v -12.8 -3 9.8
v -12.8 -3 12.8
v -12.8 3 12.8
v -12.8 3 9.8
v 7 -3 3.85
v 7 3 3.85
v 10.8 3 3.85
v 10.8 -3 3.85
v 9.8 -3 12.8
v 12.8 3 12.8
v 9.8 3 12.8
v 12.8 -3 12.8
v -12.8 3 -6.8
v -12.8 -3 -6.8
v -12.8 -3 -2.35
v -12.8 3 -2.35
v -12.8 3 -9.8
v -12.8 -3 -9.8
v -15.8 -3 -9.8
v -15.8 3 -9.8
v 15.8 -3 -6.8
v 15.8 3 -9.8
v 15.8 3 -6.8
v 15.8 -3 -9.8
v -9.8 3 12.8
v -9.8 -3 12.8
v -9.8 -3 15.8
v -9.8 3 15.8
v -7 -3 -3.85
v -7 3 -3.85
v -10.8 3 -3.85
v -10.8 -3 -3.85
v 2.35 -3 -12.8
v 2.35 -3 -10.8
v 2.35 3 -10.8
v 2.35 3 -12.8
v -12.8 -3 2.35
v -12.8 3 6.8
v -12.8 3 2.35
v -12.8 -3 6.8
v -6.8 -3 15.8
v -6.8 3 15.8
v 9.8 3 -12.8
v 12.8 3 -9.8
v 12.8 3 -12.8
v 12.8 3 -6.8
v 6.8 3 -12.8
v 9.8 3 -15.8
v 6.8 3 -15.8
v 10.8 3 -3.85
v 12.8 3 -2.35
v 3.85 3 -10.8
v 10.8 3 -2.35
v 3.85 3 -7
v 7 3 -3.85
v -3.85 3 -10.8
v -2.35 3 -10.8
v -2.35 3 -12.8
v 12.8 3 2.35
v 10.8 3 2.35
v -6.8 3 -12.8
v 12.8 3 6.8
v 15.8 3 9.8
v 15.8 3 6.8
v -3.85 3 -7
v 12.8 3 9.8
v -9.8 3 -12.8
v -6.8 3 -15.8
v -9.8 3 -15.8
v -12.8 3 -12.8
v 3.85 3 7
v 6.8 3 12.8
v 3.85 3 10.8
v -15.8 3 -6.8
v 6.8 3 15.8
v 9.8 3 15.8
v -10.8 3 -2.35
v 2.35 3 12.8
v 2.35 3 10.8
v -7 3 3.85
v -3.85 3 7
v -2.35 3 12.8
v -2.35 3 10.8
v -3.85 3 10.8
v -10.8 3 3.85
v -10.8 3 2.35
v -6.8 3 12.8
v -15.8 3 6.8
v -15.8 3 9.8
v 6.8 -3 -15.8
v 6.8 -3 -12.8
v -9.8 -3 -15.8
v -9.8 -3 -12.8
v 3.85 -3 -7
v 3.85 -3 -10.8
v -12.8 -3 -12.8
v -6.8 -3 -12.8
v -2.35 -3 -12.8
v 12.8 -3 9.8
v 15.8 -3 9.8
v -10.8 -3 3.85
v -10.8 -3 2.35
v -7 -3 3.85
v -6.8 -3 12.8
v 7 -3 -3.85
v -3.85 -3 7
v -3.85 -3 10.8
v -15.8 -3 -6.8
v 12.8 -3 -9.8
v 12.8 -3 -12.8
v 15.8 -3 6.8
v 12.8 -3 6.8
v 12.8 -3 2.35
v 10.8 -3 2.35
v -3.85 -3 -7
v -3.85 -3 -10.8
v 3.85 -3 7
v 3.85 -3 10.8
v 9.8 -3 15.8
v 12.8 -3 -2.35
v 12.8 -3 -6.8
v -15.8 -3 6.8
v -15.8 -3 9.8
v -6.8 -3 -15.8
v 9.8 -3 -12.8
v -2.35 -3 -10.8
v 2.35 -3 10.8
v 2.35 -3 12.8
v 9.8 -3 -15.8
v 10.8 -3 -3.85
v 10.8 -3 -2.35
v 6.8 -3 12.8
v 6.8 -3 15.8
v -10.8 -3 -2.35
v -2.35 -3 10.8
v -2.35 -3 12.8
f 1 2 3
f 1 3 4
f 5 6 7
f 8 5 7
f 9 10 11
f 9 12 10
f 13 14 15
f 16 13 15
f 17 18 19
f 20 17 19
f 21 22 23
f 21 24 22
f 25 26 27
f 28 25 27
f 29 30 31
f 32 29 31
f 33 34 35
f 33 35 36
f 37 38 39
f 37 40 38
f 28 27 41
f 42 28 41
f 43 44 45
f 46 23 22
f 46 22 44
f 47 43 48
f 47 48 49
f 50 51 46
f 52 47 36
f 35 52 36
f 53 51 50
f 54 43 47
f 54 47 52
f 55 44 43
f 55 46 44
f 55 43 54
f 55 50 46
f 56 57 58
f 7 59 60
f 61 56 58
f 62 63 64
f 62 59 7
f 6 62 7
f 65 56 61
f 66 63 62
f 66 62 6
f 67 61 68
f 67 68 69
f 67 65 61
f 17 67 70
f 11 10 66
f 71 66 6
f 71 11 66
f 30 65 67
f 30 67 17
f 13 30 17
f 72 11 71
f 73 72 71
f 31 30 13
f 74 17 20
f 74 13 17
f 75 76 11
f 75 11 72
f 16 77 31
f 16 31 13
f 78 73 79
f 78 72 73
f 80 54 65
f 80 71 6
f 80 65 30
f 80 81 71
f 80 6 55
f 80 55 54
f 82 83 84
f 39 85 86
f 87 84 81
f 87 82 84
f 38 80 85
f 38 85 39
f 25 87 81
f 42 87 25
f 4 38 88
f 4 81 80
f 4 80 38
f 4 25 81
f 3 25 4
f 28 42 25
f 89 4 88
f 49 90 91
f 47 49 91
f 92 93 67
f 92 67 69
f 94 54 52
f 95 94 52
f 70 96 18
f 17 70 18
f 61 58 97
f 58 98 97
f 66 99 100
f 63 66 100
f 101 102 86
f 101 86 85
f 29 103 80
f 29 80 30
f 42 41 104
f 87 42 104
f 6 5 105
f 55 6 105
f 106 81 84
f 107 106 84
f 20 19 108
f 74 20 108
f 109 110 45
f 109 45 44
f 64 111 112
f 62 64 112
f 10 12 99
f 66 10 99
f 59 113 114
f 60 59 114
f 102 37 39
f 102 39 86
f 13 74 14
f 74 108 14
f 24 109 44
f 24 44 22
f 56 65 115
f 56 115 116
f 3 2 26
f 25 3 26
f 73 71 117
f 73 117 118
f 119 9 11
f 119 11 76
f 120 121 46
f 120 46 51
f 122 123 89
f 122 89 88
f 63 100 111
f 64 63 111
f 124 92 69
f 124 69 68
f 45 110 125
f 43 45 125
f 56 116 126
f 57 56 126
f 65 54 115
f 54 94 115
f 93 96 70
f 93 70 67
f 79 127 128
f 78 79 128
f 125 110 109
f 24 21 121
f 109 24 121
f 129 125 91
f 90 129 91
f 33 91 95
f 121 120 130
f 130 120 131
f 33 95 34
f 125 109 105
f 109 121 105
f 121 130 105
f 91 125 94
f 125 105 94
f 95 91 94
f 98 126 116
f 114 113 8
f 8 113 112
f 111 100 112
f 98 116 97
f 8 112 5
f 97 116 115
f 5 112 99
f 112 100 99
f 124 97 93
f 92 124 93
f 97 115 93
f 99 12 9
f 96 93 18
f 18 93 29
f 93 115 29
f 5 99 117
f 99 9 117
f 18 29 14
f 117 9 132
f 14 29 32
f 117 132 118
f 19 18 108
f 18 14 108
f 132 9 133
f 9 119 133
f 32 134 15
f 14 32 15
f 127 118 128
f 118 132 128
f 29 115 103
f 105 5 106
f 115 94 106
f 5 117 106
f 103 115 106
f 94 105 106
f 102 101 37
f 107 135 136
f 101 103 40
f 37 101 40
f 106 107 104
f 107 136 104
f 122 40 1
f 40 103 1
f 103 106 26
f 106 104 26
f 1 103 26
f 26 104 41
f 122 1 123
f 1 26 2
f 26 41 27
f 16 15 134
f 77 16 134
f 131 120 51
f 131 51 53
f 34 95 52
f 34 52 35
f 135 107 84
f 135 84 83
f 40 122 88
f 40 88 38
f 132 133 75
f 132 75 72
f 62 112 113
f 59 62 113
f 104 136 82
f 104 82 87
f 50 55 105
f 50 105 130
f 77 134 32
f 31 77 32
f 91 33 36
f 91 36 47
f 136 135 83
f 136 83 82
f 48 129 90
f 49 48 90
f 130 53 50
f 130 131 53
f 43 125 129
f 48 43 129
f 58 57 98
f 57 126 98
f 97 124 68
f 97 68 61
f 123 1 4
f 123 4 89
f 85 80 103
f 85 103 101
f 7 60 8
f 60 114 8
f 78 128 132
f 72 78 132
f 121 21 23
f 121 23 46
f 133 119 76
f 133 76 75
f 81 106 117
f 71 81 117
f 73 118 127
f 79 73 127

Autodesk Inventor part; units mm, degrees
ref_plane "YZ Plane" through (0, 0, 0) normal (1, 0, 0) x (0, 1, 0)
ref_plane "XZ Plane" through (0, 0, 0) normal (0, 1, 0) x (-1, 0, 0)
ref_plane "XY Plane" through (0, 0, 0) normal (0, 0, 1) x (1, 0, 0)
sketch "Sketch2" plane through (0, 0, 0) normal (0, 1, 0) x (-1, 0, 0)
  line L0 (-7, 3.85) -> (-10.8, 3.85)
  line L1 (-12.8, 12.8) -> (-12.8, 9.8)
  line L2 (-10.8, 2.35) -> (-10.8, 3.85)
  line L3 (0, 0) -> (0, 7) construction
  line L4 (-12.8, 2.35) -> (-10.8, 2.35)
  line L5 (-7, 3.85) -> (-7, 0)
  line L6 (-7, 0) -> (0, 0) construction
  line L7 (-12.8, 9.8) -> (-15.8, 9.8)
  line L8 (-15.8, 9.8) -> (-15.8, 6.8)
  line L9 (-15.8, 6.8) -> (-12.8, 6.8)
  line L10 (-12.8, 6.8) -> (-12.8, 2.35)
  line L11 (-12.8, 12.8) -> (-9.8, 12.8)
  line L12 (-9.8, 12.8) -> (-9.8, 15.8)
  line L13 (-9.8, 15.8) -> (-6.8, 15.8)
  line L14 (-6.8, 15.8) -> (-6.8, 12.8)
  line L15 (0, 7) -> (-3.85, 7)
  line L16 (-3.85, 7) -> (-3.85, 10.8)
  line L17 (-3.85, 10.8) -> (-2.35, 10.8)
  line L18 (-2.35, 10.8) -> (-2.35, 12.8)
  line L19 (-2.35, 12.8) -> (-6.8, 12.8)
  line L20 (-7, -3.85) -> (-10.8, -3.85)
  line L21 (-12.8, -12.8) -> (-12.8, -9.8)
  line L22 (-10.8, -2.35) -> (-10.8, -3.85)
  line L23 (0, 0) -> (0, -7) construction
  line L24 (-12.8, -2.35) -> (-10.8, -2.35)
  line L25 (-7, -3.85) -> (-7, 0)
  line L26 (-12.8, -9.8) -> (-15.8, -9.8)
  line L27 (-15.8, -9.8) -> (-15.8, -6.8)
  line L28 (-15.8, -6.8) -> (-12.8, -6.8)
  line L29 (-12.8, -6.8) -> (-12.8, -2.35)
  line L30 (-12.8, -12.8) -> (-9.8, -12.8)
  line L31 (-9.8, -12.8) -> (-9.8, -15.8)
  line L32 (-9.8, -15.8) -> (-6.8, -15.8)
  line L33 (-6.8, -15.8) -> (-6.8, -12.8)
  line L34 (0, -7) -> (-3.85, -7)
  line L35 (-3.85, -7) -> (-3.85, -10.8)
  line L36 (-3.85, -10.8) -> (-2.35, -10.8)
  line L37 (-2.35, -10.8) -> (-2.35, -12.8)
  line L38 (-2.35, -12.8) -> (-6.8, -12.8)
  line L39 (7, 3.85) -> (10.8, 3.85)
  line L40 (12.8, 12.8) -> (12.8, 9.8)
  line L41 (10.8, 2.35) -> (10.8, 3.85)
  line L42 (12.8, 2.35) -> (10.8, 2.35)
  line L43 (7, 3.85) -> (7, 0)
  line L44 (7, 0) -> (0, 0) construction
  line L45 (12.8, 9.8) -> (15.8, 9.8)
  line L46 (15.8, 9.8) -> (15.8, 6.8)
  line L47 (15.8, 6.8) -> (12.8, 6.8)
  line L48 (12.8, 6.8) -> (12.8, 2.35)
  line L49 (12.8, 12.8) -> (9.8, 12.8)
  line L50 (9.8, 12.8) -> (9.8, 15.8)
  line L51 (9.8, 15.8) -> (6.8, 15.8)
  line L52 (6.8, 15.8) -> (6.8, 12.8)
  line L53 (0, 7) -> (3.85, 7)
  line L54 (3.85, 7) -> (3.85, 10.8)
  line L55 (3.85, 10.8) -> (2.35, 10.8)
  line L56 (2.35, 10.8) -> (2.35, 12.8)
  line L57 (2.35, 12.8) -> (6.8, 12.8)
  line L58 (7, -3.85) -> (10.8, -3.85)
  line L59 (3.85, -7) -> (3.85, -10.8)
  line L60 (2.35, -10.8) -> (2.35, -12.8)
  line L61 (3.85, -10.8) -> (2.35, -10.8)
  line L62 (7, -3.85) -> (7, 0)
  line L63 (0, -7) -> (3.85, -7)
  line L64 (2.35, -12.8) -> (6.8, -12.8)
  line L65 (9.8, -15.8) -> (6.8, -15.8)
  line L66 (6.8, -15.8) -> (6.8, -12.8)
  line L67 (9.8, -12.8) -> (9.8, -15.8)
  line L68 (12.8, -12.8) -> (9.8, -12.8)
  line L69 (12.8, -12.8) -> (12.8, -9.8)
  line L70 (10.8, -2.35) -> (10.8, -3.85)
  line L71 (12.8, -2.35) -> (10.8, -2.35)
  line L72 (12.8, -6.8) -> (12.8, -2.35)
  line L73 (12.8, -9.8) -> (15.8, -9.8)
  line L74 (15.8, -9.8) -> (15.8, -6.8)
  line L75 (15.8, -6.8) -> (12.8, -6.8)
  dimension "d4" = 2
  dimension "d8" = 3
  dimension "d9" = 3
  dimension "d11" = 3.8
  dimension "d13" = 3
  dimension "d14" = 3
  dimension "d15" = 3
  dimension "d16" = 3.85
  dimension "d17" = 3.85
  dimension "d18" = 3.8
  dimension "d20" = 2
  dimension "d22" = 3
  dimension "d23" = 3
  dimension "d27" = 2.35
  dimension "d28" = 2.35
  dimension "d29" = 7
  dimension "d30" = 7
extrude "Extrusion1" add sketch "Sketch2" along normal mid plane 6
properties part number "plunger_handle_center"
